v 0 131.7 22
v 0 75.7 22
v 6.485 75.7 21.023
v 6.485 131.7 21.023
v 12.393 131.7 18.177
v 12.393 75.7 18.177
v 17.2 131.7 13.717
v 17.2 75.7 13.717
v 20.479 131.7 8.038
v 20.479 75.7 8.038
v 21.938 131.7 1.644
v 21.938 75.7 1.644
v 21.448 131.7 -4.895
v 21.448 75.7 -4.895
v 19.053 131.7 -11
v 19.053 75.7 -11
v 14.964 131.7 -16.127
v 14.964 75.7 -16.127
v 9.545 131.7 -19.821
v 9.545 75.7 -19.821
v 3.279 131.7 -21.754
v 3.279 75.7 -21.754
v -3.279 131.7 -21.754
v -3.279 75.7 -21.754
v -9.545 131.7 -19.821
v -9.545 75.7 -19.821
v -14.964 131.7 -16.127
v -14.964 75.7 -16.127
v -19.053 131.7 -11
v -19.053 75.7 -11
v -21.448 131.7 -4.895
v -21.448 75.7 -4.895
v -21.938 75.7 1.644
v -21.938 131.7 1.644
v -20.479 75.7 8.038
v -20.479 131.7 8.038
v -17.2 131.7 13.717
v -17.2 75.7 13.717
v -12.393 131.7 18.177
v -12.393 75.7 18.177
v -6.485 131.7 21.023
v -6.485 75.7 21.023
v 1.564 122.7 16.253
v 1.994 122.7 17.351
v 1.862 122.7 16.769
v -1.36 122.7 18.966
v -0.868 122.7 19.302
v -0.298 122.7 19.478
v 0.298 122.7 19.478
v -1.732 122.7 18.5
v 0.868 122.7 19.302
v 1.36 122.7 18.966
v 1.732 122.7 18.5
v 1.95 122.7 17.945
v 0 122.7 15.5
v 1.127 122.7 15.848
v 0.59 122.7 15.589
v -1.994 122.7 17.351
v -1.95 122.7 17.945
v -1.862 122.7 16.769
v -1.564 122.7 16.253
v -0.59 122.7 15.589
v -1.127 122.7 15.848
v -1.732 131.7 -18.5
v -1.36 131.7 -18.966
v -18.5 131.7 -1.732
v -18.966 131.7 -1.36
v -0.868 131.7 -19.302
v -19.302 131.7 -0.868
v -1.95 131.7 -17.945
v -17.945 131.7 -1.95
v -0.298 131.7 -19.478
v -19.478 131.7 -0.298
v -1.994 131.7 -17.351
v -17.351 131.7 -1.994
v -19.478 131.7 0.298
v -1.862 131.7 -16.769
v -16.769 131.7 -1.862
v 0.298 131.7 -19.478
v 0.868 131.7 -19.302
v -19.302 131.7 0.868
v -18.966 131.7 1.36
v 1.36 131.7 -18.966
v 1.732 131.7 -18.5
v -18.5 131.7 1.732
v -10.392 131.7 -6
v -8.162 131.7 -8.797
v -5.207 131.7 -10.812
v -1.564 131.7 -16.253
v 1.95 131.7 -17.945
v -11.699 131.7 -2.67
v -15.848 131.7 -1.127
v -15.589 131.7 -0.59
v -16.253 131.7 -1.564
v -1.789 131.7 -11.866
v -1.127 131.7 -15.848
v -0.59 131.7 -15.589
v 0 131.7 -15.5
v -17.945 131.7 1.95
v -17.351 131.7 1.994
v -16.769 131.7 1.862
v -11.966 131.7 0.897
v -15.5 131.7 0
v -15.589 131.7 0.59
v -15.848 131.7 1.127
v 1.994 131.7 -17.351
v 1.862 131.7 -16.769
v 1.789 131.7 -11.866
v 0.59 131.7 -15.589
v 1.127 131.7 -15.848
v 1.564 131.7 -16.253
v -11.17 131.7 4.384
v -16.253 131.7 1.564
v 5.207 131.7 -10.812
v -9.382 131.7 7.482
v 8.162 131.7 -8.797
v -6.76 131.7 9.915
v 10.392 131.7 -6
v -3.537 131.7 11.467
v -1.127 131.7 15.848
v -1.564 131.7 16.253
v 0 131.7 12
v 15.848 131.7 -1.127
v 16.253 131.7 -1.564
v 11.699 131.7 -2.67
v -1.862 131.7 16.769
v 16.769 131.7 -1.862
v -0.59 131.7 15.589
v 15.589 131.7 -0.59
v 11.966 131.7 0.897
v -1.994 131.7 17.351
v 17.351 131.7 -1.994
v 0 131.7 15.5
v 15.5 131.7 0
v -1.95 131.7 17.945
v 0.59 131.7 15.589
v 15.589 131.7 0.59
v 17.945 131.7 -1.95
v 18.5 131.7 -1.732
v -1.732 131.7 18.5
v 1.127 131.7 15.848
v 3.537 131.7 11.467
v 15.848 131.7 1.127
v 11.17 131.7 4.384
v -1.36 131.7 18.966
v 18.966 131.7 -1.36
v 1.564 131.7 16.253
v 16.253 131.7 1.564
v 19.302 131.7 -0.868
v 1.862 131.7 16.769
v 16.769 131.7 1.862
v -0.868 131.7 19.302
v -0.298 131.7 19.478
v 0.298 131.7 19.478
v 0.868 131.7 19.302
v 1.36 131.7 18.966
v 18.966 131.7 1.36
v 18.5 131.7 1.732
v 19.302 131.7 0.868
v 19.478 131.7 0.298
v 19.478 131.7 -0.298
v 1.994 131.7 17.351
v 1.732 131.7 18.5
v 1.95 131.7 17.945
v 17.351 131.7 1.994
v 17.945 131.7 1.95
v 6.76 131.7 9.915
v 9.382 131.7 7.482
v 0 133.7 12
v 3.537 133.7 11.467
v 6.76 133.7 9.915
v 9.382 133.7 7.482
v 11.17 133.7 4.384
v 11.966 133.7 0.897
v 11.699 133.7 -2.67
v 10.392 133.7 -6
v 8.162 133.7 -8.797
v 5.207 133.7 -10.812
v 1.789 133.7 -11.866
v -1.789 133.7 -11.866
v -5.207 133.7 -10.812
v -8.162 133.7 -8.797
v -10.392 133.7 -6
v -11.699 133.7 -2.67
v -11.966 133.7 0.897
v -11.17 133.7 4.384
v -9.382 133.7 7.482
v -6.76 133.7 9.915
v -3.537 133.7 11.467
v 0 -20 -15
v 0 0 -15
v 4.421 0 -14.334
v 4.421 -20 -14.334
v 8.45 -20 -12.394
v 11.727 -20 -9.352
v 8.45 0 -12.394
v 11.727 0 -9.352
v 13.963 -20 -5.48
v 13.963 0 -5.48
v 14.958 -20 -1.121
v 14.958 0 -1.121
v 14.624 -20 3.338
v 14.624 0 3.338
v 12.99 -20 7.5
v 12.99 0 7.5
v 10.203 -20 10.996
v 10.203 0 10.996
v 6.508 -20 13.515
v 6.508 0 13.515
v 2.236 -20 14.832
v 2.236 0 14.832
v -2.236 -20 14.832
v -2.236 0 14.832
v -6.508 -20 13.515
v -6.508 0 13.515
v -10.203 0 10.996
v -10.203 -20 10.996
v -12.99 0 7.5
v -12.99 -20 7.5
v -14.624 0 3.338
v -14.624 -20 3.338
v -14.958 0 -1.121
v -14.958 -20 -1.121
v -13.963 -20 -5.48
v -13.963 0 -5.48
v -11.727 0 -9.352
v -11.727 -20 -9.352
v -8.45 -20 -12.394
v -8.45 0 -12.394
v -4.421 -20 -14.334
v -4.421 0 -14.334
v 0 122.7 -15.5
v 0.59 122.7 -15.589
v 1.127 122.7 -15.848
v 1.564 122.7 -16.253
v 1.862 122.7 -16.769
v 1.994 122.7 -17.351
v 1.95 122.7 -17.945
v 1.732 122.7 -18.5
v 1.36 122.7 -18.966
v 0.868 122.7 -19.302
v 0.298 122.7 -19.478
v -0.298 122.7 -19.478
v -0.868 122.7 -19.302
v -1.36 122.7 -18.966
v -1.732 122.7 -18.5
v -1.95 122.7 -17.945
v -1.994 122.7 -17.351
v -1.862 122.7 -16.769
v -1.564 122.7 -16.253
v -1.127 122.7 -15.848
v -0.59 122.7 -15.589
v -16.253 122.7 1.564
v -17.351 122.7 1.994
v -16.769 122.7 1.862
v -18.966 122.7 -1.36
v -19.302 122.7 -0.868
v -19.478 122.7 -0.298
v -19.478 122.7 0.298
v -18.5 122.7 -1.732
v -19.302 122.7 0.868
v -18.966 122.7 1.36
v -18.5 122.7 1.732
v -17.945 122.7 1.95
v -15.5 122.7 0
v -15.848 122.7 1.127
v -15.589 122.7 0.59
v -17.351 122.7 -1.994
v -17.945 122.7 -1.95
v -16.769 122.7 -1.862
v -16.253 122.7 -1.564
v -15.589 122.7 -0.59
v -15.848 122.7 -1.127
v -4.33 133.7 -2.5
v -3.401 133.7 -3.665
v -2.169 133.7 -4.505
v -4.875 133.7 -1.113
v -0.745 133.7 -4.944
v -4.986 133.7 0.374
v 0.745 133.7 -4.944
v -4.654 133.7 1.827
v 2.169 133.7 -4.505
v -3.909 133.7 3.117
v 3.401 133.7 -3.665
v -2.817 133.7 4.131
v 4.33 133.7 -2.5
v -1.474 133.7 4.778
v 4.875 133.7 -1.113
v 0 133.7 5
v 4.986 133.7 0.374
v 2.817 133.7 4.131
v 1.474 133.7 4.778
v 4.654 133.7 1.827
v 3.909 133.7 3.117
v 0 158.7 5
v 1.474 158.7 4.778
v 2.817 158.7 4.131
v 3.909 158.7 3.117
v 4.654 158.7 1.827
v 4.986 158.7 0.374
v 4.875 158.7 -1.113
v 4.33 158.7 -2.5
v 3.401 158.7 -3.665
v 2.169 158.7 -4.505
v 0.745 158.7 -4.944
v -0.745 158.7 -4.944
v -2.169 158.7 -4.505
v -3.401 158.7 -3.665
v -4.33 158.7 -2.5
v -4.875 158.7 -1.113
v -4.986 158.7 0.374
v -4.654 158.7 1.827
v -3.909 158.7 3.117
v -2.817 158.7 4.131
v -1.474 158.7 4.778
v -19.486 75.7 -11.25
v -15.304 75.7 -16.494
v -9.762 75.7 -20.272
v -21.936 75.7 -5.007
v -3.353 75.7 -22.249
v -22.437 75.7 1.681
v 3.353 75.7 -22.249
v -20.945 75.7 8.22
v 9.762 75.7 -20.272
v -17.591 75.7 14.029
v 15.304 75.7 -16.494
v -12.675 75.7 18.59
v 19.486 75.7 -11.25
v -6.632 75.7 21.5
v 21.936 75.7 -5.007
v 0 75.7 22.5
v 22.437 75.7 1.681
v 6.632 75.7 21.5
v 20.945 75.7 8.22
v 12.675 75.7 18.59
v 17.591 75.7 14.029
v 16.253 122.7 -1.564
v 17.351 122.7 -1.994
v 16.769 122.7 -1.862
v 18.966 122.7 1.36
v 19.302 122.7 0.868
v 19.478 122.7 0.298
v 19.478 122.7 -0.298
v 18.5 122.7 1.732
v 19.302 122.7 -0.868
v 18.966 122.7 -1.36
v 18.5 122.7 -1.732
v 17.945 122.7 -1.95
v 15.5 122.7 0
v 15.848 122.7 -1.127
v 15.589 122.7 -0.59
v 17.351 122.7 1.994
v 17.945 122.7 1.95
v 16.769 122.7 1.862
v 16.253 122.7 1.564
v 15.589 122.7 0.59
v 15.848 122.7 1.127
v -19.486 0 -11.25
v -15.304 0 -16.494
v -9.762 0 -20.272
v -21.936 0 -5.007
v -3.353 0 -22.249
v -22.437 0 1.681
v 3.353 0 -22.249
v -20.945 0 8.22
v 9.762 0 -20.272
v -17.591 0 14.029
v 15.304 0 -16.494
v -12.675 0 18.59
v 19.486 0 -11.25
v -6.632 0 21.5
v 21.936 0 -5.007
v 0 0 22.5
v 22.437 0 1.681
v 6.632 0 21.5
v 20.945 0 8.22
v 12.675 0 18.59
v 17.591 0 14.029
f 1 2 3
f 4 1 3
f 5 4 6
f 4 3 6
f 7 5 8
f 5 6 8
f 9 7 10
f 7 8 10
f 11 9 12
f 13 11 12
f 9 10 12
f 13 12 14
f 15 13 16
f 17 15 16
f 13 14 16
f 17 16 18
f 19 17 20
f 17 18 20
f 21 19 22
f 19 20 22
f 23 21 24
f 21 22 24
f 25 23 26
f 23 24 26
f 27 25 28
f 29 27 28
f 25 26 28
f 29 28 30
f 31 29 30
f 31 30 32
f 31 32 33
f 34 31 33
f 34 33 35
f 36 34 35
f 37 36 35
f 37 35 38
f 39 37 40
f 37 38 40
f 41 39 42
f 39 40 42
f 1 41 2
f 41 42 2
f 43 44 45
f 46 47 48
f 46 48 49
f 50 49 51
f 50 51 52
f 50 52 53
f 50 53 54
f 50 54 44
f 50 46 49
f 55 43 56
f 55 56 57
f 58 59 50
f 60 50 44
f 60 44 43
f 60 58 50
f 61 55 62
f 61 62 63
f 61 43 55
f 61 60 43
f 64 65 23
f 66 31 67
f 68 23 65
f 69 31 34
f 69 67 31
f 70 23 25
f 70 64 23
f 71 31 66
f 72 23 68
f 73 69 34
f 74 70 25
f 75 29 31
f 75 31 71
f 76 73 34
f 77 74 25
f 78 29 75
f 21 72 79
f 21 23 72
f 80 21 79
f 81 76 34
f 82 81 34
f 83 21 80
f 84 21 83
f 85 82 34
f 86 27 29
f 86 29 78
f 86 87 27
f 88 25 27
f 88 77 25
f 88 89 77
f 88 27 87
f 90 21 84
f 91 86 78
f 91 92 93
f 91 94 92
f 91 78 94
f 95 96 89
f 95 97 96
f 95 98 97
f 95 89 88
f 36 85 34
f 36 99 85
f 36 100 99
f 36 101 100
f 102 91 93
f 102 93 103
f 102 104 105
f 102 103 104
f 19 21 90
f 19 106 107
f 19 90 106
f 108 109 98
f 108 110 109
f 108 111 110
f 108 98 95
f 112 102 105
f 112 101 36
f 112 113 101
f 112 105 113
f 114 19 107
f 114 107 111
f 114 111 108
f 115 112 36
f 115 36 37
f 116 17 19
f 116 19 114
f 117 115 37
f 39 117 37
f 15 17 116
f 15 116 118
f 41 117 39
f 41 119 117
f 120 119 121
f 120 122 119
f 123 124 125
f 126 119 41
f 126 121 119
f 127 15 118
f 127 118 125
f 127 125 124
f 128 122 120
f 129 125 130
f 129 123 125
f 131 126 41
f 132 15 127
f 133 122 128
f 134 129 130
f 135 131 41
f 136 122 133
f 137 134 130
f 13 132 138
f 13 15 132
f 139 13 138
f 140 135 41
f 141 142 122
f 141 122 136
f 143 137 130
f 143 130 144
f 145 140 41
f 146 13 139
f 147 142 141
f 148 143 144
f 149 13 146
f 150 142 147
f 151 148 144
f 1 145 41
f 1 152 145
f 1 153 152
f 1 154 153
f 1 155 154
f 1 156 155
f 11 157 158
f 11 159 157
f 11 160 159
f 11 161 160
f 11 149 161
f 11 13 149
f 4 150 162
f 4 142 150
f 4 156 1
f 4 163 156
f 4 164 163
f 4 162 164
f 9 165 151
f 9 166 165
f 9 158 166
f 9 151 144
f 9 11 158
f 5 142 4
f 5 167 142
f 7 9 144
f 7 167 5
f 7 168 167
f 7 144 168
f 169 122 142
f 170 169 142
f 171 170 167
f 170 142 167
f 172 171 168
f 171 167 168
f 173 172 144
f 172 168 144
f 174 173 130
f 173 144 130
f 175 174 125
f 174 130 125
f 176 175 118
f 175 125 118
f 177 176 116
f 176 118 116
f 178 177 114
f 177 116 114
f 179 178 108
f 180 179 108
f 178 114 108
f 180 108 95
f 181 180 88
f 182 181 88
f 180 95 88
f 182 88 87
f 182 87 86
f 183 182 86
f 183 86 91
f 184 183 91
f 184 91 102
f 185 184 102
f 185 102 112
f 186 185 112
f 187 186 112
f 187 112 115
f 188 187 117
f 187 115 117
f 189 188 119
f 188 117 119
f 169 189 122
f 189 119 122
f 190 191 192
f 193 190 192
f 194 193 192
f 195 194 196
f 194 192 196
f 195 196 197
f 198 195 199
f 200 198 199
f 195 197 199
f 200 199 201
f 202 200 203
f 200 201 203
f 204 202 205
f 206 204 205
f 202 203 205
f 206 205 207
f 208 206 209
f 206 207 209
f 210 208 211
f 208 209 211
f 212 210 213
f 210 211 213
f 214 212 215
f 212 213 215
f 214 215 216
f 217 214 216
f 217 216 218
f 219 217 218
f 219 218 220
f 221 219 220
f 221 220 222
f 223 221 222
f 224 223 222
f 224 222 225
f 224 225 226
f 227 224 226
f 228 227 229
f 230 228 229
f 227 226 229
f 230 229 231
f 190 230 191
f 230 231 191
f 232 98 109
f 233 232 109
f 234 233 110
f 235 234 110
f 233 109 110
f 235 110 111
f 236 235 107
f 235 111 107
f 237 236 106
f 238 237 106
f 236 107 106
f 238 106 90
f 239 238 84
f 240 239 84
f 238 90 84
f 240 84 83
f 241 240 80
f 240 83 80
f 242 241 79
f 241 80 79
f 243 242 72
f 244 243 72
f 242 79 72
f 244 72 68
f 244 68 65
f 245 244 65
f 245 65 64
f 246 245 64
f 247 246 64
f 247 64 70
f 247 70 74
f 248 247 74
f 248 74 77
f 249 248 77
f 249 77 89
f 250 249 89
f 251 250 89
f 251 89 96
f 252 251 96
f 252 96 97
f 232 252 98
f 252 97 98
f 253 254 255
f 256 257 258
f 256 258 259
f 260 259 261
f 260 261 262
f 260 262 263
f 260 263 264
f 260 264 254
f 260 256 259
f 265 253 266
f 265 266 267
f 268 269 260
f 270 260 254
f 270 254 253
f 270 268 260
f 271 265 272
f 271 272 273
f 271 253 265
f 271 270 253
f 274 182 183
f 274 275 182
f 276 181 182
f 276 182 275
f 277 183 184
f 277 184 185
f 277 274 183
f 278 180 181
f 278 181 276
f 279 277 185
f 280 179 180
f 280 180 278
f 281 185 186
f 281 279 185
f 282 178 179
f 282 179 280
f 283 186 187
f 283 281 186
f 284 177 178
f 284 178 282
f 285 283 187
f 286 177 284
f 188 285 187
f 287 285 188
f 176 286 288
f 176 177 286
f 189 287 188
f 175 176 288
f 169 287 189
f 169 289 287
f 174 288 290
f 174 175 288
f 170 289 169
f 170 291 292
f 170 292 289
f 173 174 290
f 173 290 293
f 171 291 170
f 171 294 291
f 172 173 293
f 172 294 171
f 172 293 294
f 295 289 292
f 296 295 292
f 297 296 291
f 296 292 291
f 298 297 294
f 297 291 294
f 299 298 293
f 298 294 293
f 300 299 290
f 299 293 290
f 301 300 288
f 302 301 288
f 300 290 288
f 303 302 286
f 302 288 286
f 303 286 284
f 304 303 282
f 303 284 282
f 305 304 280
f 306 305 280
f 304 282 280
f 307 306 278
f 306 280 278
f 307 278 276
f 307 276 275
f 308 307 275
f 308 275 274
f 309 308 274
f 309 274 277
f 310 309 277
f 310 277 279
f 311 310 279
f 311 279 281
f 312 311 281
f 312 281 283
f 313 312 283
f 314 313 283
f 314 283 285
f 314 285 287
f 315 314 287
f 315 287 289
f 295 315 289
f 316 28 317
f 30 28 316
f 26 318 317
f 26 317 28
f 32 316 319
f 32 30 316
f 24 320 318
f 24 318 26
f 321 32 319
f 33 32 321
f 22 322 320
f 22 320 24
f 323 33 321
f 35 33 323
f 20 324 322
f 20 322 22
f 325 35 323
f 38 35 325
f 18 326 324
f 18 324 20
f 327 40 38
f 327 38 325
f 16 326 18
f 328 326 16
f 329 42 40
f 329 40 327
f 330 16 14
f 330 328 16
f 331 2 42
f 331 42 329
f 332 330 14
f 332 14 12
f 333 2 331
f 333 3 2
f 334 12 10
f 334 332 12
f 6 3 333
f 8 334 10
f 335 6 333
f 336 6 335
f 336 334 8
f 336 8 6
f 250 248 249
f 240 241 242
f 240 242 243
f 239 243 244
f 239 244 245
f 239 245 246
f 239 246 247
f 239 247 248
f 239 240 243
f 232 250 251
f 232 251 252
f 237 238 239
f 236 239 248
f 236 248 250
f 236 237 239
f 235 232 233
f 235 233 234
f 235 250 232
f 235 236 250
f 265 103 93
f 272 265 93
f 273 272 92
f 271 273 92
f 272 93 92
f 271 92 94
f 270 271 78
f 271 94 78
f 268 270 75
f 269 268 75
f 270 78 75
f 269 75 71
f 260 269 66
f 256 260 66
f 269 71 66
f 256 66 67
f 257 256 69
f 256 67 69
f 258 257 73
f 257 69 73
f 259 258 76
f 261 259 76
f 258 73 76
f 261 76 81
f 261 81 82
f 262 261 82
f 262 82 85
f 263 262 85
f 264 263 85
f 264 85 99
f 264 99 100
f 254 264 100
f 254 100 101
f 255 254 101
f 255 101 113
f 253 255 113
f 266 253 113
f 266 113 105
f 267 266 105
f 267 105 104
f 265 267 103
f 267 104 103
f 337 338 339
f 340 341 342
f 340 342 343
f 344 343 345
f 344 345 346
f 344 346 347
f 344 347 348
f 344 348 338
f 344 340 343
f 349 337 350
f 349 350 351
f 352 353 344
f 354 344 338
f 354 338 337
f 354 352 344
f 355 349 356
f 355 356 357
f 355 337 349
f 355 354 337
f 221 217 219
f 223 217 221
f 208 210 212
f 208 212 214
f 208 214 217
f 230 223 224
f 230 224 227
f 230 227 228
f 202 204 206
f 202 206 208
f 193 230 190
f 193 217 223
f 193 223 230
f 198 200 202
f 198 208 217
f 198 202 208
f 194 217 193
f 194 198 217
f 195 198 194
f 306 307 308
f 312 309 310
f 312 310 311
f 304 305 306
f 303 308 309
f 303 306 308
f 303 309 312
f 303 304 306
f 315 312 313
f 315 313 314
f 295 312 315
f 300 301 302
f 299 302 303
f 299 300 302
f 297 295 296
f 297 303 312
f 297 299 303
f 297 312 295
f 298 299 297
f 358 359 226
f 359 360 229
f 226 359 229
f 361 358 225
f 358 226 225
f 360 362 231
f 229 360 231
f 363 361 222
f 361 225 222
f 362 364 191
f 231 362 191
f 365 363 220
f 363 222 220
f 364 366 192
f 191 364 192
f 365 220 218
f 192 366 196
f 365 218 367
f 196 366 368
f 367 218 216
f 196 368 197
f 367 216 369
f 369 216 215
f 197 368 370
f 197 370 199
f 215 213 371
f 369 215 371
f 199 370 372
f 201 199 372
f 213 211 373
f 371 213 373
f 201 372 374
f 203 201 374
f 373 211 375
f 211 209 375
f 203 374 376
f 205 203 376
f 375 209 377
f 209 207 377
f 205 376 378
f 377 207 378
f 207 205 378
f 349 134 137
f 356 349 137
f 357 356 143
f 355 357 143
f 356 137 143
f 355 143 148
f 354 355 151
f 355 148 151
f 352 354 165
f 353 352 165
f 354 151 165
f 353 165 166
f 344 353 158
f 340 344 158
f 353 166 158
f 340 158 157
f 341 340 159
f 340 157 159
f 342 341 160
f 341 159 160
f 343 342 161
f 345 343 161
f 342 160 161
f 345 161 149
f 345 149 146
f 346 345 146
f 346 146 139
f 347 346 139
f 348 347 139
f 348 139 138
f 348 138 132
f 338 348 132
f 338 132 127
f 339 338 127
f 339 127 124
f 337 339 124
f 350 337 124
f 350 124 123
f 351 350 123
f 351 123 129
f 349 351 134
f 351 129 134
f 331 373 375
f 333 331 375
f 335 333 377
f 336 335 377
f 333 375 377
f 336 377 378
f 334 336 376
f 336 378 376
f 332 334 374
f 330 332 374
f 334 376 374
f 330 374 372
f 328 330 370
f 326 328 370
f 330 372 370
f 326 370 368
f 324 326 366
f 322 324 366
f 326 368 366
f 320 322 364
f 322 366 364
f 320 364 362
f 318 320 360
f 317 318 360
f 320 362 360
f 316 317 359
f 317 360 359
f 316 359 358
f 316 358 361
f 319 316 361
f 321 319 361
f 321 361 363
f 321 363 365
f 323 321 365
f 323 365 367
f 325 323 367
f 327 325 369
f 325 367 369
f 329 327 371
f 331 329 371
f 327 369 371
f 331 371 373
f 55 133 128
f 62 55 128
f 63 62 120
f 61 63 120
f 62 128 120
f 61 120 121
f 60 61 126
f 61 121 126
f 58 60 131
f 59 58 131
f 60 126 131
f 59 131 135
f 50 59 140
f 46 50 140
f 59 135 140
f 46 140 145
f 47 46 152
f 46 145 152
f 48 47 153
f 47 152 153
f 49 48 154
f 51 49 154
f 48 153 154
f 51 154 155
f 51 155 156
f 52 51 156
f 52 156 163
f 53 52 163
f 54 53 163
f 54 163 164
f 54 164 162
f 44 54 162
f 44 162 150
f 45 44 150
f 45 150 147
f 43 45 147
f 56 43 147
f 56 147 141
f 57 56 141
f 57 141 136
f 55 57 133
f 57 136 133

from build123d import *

# Parameters (mm, degrees)
SKETCH1_R           = 22.5
BOSS_EXTRUDE1_DEPTH = 75.7
SKETCH2_R           = 22
BOSS_EXTRUDE3_DEPTH = 56
SKETCH3_R           = 5
BOSS_EXTRUDE4_DEPTH = 27
SKETCH5_R           = 2
CUT_EXTRUDE2_DEPTH  = 9
CIRPATTERN1_COUNT   = 4
SKETCH6_R           = 12
BOSS_EXTRUDE5_DEPTH = 2
SKETCH7_R           = 15
BOSS_EXTRUDE6_DEPTH = 20


with BuildPart() as part:
    # Sketch1 → Boss-Extrude1 (new body)
    with BuildSketch(Plane(origin=(0, 0, 0), x_dir=(1, 0, 0), z_dir=(0, 1, 0))):
        with Locations(Location((0, 0, 0), (0, 0, 270))):
            Circle(SKETCH1_R)
    extrude(amount=BOSS_EXTRUDE1_DEPTH)

    # Sketch2 → Boss-Extrude3 (add)
    with BuildSketch(Plane(origin=(0, 75.7, 0), x_dir=(1, 0, 0), z_dir=(0, 1, 0))):
        with Locations(Location((0, 0, 0), (0, 0, 270))):
            Circle(SKETCH2_R)
    extrude(amount=BOSS_EXTRUDE3_DEPTH)

    # Sketch3 → Boss-Extrude4 (add)
    with BuildSketch(Plane(origin=(0, 131.7, 0), x_dir=(1, 0, 0), z_dir=(0, 1, 0))):
        with Locations(Location((0, 0, 0), (0, 0, 270))):
            Circle(SKETCH3_R)
    extrude(amount=BOSS_EXTRUDE4_DEPTH)

    # Sketch5 → Cut-Extrude2 (cut)
    with BuildSketch(Plane(origin=(0, 131.7, 0), x_dir=(1, 0, 0), z_dir=(0, 1, 0))):
        with Locations(Location((0, 17.5, 0), (0, 0, 270))):
            Circle(SKETCH5_R)
    cut_extrude2 = extrude(amount=-CUT_EXTRUDE2_DEPTH, mode=Mode.SUBTRACT)

    # CirPattern1: Cut-Extrude2 ×4 about axis
    cirpattern1_axis = Axis((0, 0, 0), (0, 1, 0))
    for i in range(1, CIRPATTERN1_COUNT):
        add(cut_extrude2.rotate(cirpattern1_axis, i * 360 / CIRPATTERN1_COUNT), mode=Mode.SUBTRACT)

    # Sketch6 → Boss-Extrude5 (add)
    with BuildSketch(Plane(origin=(0, 131.7, 0), x_dir=(1, 0, 0), z_dir=(0, 1, 0))):
        with Locations(Location((0, 0, 0), (0, 0, 270))):
            Circle(SKETCH6_R)
    extrude(amount=BOSS_EXTRUDE5_DEPTH)

    # Sketch7 → Boss-Extrude6 (add)
    with BuildSketch(Plane.XZ):
        with Locations(Location((0, 0, 0), (0, 0, 270))):
            Circle(SKETCH7_R)
    extrude(amount=BOSS_EXTRUDE6_DEPTH)


solid = part.part
